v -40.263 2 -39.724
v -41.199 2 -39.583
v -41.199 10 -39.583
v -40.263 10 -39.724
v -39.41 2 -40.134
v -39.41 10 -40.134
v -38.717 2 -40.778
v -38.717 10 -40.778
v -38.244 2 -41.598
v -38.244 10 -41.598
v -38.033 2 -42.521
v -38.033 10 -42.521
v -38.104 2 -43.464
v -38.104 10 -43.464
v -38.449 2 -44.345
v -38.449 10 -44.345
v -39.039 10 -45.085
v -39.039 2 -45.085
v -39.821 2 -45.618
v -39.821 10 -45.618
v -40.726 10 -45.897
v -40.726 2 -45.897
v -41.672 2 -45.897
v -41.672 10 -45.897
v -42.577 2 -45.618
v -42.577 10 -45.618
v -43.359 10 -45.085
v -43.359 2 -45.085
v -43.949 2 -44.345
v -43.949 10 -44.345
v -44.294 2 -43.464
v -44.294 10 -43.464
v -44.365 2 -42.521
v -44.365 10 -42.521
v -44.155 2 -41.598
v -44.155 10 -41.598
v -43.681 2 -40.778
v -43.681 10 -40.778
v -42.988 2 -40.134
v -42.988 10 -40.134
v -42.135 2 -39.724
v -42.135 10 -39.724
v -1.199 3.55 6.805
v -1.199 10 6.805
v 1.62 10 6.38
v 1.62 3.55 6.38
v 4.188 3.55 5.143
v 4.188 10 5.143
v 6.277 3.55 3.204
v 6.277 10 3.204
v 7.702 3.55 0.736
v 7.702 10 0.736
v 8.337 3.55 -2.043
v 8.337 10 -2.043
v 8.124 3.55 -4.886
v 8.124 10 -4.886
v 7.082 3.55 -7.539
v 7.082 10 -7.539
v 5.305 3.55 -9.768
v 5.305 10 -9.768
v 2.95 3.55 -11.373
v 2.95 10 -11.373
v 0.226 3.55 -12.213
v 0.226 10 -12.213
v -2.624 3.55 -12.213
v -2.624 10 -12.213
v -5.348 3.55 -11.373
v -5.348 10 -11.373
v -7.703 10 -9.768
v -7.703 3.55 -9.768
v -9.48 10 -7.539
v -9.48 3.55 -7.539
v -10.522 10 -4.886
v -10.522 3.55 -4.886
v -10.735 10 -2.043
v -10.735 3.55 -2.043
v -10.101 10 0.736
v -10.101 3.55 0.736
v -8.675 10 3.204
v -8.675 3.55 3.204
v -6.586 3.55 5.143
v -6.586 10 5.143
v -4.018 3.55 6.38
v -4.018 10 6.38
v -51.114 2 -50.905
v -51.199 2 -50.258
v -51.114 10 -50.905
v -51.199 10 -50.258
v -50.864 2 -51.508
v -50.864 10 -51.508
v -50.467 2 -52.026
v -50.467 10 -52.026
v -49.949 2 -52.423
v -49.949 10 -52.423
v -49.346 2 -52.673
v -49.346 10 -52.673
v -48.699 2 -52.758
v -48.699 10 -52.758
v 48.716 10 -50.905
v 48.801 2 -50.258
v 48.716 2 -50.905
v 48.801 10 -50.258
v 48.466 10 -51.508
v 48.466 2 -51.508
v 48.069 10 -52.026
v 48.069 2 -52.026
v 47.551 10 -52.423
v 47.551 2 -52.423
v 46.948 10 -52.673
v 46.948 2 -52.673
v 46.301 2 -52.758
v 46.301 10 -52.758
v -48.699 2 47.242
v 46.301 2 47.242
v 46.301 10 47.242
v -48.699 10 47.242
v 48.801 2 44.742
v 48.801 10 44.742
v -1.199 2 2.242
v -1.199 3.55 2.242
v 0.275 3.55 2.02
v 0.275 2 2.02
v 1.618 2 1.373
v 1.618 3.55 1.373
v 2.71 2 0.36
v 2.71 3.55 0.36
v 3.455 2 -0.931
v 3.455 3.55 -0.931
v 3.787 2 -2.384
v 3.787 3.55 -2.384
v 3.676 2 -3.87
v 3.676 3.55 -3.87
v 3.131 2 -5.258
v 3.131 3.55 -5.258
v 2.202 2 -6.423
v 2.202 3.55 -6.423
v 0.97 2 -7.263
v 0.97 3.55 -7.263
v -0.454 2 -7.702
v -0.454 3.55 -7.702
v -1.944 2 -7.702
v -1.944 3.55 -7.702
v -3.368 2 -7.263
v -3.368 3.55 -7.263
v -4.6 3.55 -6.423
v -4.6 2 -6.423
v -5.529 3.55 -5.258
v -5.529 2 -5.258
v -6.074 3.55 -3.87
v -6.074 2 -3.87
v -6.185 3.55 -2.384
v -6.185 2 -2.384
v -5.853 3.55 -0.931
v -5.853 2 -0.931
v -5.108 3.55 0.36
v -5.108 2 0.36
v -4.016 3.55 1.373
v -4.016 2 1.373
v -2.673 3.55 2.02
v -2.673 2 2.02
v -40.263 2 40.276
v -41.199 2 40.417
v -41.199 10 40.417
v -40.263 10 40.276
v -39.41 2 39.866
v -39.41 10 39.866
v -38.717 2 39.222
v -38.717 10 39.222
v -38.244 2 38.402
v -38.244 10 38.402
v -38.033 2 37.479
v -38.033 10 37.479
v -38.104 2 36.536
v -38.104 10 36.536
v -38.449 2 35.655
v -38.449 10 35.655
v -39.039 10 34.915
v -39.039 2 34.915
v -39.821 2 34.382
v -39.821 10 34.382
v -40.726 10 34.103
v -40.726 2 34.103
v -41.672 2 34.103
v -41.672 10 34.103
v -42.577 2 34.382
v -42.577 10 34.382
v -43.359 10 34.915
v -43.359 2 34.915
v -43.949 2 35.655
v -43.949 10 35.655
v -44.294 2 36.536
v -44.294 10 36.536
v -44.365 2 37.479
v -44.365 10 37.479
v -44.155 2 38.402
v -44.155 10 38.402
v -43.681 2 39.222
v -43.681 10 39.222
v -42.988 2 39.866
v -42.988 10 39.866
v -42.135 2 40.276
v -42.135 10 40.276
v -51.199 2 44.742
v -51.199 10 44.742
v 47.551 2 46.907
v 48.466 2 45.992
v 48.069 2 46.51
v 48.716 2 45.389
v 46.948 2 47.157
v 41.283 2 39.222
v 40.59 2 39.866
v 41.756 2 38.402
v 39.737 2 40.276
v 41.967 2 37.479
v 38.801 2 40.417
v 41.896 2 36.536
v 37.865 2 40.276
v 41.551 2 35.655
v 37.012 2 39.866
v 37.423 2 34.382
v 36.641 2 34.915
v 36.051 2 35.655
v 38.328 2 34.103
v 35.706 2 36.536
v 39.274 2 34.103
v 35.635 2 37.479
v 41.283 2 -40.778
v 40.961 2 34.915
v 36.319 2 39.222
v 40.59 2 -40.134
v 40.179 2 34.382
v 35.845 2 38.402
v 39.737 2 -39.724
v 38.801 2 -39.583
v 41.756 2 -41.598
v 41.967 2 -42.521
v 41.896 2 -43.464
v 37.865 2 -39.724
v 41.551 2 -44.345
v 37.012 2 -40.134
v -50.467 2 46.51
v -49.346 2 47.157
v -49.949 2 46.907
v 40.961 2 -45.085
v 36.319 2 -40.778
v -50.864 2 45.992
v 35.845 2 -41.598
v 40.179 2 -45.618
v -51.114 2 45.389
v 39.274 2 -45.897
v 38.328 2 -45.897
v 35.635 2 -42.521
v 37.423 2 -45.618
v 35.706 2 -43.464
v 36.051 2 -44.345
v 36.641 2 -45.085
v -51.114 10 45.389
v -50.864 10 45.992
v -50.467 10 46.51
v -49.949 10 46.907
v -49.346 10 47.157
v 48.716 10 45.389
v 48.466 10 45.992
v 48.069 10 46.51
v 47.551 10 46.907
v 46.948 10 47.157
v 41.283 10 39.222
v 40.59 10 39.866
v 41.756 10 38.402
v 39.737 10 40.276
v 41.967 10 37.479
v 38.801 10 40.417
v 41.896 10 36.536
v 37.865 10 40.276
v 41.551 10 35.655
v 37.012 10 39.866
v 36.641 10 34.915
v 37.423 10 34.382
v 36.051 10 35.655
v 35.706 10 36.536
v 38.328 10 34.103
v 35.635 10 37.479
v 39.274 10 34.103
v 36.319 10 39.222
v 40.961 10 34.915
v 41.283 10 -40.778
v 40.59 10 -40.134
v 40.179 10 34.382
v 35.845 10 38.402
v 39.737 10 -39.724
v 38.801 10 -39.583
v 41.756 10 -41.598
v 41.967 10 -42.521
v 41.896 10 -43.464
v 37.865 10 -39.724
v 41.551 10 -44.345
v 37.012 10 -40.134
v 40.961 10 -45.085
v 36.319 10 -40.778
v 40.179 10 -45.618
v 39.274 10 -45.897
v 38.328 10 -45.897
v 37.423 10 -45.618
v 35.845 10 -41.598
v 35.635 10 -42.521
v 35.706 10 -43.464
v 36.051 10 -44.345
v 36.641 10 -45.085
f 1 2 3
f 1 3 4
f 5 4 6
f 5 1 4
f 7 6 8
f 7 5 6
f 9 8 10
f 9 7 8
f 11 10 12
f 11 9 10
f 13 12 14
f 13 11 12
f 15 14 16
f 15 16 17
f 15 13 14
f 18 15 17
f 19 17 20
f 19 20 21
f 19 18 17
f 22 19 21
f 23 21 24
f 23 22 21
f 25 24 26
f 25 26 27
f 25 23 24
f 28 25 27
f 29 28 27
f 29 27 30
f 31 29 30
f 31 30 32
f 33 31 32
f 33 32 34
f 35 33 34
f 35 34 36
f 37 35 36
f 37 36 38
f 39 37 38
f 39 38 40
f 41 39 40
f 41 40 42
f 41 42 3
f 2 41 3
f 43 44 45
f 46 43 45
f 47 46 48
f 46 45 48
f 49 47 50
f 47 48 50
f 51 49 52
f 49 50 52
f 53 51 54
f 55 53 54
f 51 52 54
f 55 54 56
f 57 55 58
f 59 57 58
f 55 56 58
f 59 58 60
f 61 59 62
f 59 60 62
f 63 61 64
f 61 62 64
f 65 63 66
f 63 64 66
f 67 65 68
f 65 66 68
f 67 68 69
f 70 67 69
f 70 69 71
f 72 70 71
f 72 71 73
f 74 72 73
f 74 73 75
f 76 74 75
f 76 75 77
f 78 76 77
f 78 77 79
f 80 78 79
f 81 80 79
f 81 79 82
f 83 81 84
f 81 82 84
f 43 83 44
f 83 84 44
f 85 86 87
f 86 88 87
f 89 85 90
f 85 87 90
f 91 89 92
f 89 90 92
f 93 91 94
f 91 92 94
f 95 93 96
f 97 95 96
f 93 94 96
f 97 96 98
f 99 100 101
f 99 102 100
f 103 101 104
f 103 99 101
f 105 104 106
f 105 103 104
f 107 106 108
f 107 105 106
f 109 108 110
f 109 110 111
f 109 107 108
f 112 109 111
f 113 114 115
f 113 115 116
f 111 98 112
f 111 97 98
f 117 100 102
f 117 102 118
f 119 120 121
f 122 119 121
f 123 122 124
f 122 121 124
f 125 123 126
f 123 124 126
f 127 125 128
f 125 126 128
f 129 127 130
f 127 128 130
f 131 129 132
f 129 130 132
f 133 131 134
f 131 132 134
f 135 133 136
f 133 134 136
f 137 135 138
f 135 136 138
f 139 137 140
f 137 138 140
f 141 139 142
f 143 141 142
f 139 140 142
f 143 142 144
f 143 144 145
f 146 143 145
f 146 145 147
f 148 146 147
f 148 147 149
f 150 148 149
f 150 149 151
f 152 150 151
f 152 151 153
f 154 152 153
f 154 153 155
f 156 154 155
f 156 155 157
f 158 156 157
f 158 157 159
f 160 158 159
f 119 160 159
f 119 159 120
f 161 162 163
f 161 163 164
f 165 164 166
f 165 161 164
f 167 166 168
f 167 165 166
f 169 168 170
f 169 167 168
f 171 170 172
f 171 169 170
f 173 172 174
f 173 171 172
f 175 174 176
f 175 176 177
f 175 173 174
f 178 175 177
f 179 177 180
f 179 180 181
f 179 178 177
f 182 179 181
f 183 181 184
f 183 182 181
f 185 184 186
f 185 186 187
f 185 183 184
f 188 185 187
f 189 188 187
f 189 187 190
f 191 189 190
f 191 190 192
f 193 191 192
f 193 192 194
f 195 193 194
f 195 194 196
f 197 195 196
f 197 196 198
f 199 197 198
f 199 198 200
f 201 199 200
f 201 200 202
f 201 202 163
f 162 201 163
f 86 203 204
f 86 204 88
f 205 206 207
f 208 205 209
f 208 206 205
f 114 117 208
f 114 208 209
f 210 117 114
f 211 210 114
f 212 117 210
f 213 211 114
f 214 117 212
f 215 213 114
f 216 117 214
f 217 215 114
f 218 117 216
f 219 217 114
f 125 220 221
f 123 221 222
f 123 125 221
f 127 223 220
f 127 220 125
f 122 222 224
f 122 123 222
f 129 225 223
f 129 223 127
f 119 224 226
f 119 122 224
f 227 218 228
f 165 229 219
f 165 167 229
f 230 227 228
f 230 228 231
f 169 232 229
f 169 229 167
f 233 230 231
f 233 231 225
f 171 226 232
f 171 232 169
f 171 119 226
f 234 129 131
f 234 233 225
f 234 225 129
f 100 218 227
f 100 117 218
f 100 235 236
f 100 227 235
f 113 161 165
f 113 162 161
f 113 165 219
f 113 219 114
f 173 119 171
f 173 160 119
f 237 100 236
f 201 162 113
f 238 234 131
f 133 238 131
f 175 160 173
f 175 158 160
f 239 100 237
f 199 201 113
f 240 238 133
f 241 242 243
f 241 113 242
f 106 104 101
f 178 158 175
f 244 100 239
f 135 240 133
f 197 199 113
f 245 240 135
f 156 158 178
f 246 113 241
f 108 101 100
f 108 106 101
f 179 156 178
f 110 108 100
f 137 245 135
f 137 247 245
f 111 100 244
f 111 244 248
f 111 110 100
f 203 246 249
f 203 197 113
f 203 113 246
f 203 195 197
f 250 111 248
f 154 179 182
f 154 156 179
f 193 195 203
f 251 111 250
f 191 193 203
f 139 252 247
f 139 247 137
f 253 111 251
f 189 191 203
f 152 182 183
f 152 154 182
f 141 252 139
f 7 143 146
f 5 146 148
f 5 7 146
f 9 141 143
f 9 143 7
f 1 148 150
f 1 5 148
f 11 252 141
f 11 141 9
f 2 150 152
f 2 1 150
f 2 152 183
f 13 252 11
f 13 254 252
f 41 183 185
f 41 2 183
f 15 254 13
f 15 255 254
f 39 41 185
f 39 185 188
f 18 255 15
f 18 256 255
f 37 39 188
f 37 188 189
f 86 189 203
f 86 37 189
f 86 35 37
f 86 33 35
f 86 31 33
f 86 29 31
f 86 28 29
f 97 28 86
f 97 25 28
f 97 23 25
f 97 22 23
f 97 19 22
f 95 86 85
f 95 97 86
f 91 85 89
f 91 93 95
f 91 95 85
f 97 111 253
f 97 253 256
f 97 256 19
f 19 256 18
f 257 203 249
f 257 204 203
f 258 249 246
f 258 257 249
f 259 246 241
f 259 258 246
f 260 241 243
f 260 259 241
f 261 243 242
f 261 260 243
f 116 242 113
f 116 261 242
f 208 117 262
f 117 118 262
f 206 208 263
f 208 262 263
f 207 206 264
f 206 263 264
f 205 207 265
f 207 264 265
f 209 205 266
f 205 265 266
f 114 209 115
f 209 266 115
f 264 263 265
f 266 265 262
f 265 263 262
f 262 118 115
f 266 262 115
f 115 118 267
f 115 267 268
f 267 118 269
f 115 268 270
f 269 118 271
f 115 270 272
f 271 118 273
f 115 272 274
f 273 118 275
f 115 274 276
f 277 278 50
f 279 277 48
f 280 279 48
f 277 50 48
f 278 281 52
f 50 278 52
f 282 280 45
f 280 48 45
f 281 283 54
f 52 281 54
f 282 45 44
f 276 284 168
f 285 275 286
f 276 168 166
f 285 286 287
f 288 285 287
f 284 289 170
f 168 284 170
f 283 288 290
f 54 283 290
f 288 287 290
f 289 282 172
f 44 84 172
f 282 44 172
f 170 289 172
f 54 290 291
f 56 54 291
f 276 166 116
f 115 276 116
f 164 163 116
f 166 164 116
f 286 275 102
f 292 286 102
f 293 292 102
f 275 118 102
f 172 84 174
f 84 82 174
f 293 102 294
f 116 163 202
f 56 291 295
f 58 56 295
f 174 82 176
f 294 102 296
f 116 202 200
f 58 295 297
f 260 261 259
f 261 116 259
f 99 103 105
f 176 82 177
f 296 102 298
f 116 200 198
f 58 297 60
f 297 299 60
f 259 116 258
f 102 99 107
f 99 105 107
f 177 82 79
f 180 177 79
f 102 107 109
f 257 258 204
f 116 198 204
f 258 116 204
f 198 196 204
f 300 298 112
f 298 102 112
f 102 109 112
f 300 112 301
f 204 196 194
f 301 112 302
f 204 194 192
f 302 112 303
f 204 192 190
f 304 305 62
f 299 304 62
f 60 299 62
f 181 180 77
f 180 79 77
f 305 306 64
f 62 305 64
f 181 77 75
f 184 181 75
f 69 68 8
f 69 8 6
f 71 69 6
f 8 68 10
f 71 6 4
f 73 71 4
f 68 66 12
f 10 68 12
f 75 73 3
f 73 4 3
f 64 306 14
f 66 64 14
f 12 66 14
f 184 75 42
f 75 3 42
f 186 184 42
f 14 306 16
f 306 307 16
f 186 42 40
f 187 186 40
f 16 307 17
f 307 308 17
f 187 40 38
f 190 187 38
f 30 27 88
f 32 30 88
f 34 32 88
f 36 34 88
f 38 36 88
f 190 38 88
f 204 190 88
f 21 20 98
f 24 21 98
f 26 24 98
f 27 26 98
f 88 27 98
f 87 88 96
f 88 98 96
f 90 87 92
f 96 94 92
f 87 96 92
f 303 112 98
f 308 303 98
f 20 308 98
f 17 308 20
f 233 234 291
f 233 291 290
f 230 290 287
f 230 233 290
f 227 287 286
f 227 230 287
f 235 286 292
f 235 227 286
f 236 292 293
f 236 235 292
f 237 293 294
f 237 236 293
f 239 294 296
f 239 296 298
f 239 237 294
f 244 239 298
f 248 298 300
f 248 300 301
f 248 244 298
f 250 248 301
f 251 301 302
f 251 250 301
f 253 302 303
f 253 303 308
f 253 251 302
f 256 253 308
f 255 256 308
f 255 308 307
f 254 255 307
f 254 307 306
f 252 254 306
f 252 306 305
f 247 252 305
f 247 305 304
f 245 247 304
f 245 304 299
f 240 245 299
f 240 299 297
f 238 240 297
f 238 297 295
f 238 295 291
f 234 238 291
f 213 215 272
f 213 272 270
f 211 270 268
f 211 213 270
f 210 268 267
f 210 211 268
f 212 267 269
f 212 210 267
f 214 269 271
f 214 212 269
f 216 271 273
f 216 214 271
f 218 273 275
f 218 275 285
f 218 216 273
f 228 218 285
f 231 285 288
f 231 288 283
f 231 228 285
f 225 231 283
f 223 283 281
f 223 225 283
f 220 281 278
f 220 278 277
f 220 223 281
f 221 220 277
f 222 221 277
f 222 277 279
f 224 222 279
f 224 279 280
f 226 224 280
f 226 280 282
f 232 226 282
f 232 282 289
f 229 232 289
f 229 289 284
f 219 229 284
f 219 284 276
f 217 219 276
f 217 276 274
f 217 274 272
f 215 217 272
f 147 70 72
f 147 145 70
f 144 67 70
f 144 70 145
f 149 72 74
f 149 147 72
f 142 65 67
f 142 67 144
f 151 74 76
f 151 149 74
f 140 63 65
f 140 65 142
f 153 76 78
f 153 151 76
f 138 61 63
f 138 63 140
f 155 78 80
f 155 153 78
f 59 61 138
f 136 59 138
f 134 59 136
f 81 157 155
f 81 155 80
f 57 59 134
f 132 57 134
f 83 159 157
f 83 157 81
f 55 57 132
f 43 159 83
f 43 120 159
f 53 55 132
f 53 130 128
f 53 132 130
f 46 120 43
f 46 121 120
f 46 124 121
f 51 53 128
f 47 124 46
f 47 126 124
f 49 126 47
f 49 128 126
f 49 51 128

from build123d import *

# Parameters (mm, degrees)
SKETCH1_R           = 12.7
SKETCH1_R_2         = 3.175
BOSS_EXTRUDE1_DEPTH = 10
SKETCH1_3_R         = 12.7
SKETCH1_3_R_2       = 6.35
BOSS_EXTRUDE2_DEPTH = 2.5
SKETCH2_R           = 12.7
BOSS_EXTRUDE3_DEPTH = 10
SKETCH3_R           = 5
CUT_EXTRUDE3_DEPTH  = 10
CUT_EXTRUDE4_START  = -1.45
SKETCH4_R           = 10
CUT_EXTRUDE4_DEPTH  = 5
CUT_EXTRUDE5_DEPTH  = 2
SKETCH7_R           = 10
CUT_EXTRUDE7_DEPTH  = 6.45
BOSS_EXTRUDE4_START = 6.45
SKETCH8_R           = 10
SKETCH8_R_2         = 9.5625
BOSS_EXTRUDE4_DEPTH = 6.45
BOSS_EXTRUDE5_START = -8
BOSS_EXTRUDE5_DEPTH = 8
FILLET1_R           = 2.5


with BuildPart() as part:
    # Sketch1 → Boss-Extrude1 (new body)
    with BuildSketch(Plane(origin=(0, 0, 0), x_dir=(1, 0, 0), z_dir=(0, 1, 0))):
        with BuildLine():
            Line((-41.199040767, 52.757793765), (38.800959233, 52.757793765))
            ThreePointArc((38.800959233, 52.757793765), (45.872027044, 49.828861577), (48.800959233, 42.757793765))
            Line((48.800959233, 42.757793765), (48.800959233, -37.242206235))
            ThreePointArc((48.800959233, -37.242206235), (45.872027044, -44.313274047), (38.800959233, -47.242206235))
            Line((38.800959233, -47.242206235), (-41.199040767, -47.242206235))
            ThreePointArc((-41.199040767, -47.242206235), (-48.270108579, -44.313274047), (-51.199040767, -37.242206235))
            Line((-51.199040767, -37.242206235), (-51.199040767, 42.757793765))
            ThreePointArc((-51.199040767, 42.757793765), (-48.270108579, 49.828861577), (-41.199040767, 52.757793765))
        make_face()
        with Locations(Location((0, 0, 0), (0, 0, 270))):
            Circle(SKETCH1_R, mode=Mode.SUBTRACT)
        with Locations(Location((-41.199040767, 42.757793765, 0), (0, 0, 270))):
            Circle(SKETCH1_R_2, mode=Mode.SUBTRACT)
        with Locations(Location((38.800959233, 42.757793765, 0), (0, 0, 270))):
            Circle(SKETCH1_R_2, mode=Mode.SUBTRACT)
        with Locations(Location((38.800959233, -37.242206235, 0), (0, 0, 270))):
            Circle(SKETCH1_R_2, mode=Mode.SUBTRACT)
        with Locations(Location((-41.199040767, -37.242206235, 0), (0, 0, 270))):
            Circle(SKETCH1_R_2, mode=Mode.SUBTRACT)
    extrude(amount=BOSS_EXTRUDE1_DEPTH)

    # Sketch1<3> → Boss-Extrude2 (add)
    with BuildSketch(Plane(origin=(0, 0, 0), x_dir=(1, 0, 0), z_dir=(0, 1, 0))):
        with Locations(Location((0, 0, 0), (0, 0, 270))):
            Circle(SKETCH1_3_R)
        with Locations(Location((0, 0, 0), (0, 0, 270))):
            Circle(SKETCH1_3_R_2, mode=Mode.SUBTRACT)
    extrude(amount=BOSS_EXTRUDE2_DEPTH)

    # Sketch2 → Boss-Extrude3 (add, through all)
    with BuildSketch(Plane(origin=(0, 10, 0), x_dir=(1, 0, 0), z_dir=(0, 1, 0))):
        Circle(SKETCH2_R)
    extrude(amount=-BOSS_EXTRUDE3_DEPTH)

    # Sketch3 → Cut-Extrude3 (cut)
    with BuildSketch(Plane(origin=(0, 10, 0), x_dir=(1, 0, 0), z_dir=(0, 1, 0))):
        with Locations(Location((-1.199040767, 2.757793765, 0), (0, 0, 270))):
            Circle(SKETCH3_R)
    extrude(amount=-CUT_EXTRUDE3_DEPTH, mode=Mode.SUBTRACT)

    # Sketch4 → Cut-Extrude4 (cut)
    with BuildSketch(Plane(origin=(0, 10, 0), x_dir=(1, 0, 0), z_dir=(0, 1, 0)).offset(CUT_EXTRUDE4_START)):
        with Locations(Location((-1.199040767, 2.757793765, 0), (0, 0, 270))):
            Circle(SKETCH4_R)
    extrude(amount=-CUT_EXTRUDE4_DEPTH, mode=Mode.SUBTRACT)

    # Sketch6 → Cut-Extrude5 (cut)
    with BuildSketch(Plane.XZ):
        with BuildLine():
            Line((48.800959233, -42.757793765), (48.800959233, 37.242206235))
            ThreePointArc((48.800959233, 37.242206235), (45.872027044, 44.313274047), (38.800959233, 47.242206235))
            Line((38.800959233, 47.242206235), (-41.199040767, 47.242206235))
            ThreePointArc((-41.199040767, 47.242206235), (-48.270108579, 44.313274047), (-51.199040767, 37.242206235))
            Line((-51.199040767, 37.242206235), (-51.199040767, -42.757793765))
            ThreePointArc((-51.199040767, -42.757793765), (-48.270108579, -49.828861577), (-41.199040767, -52.757793765))
            Line((-41.199040767, -52.757793765), (38.800959233, -52.757793765))
            ThreePointArc((38.800959233, -52.757793765), (45.872027044, -49.828861577), (48.800959233, -42.757793765))
        make_face()
    extrude(amount=-CUT_EXTRUDE5_DEPTH, mode=Mode.SUBTRACT)

    # Sketch7 → Cut-Extrude7 (cut)
    with BuildSketch(Plane(origin=(0, 10, 0), x_dir=(1, 0, 0), z_dir=(0, 1, 0))):
        with Locations(Location((-1.199040767, 2.757793765, 0), (0, 0, 270))):
            Circle(SKETCH7_R)
    extrude(amount=-CUT_EXTRUDE7_DEPTH, mode=Mode.SUBTRACT)

    # Sketch8 → Boss-Extrude4 (add)
    with BuildSketch(Plane(origin=(0, 3.55, 0), x_dir=(1, 0, 0), z_dir=(0, 1, 0)).offset(BOSS_EXTRUDE4_START)):
        with Locations((-1.199040767, 2.757793765)):
            Circle(SKETCH8_R)
        with Locations(Location((-1.199040767, 2.757793765, 0), (0, 0, 270))):
            Circle(SKETCH8_R_2, mode=Mode.SUBTRACT)
    extrude(amount=-BOSS_EXTRUDE4_DEPTH)

    # Sketch9 → Boss-Extrude5 (add)
    with BuildSketch(Plane(origin=(0, 10, 0), x_dir=(1, 0, 0), z_dir=(0, 1, 0)).offset(BOSS_EXTRUDE5_START)):
        with BuildLine():
            Line((-51.199040767, 42.757793765), (-51.199040767, 52.757793765))
            Line((-51.199040767, 52.757793765), (-41.199040767, 52.757793765))
            ThreePointArc((-41.199040767, 52.757793765), (-48.270108579, 49.828861577), (-51.199040767, 42.757793765))
        make_face()
        with BuildLine():
            Line((38.800959233, 52.757793765), (48.800959233, 52.757793765))
            Line((48.800959233, 52.757793765), (48.800959233, 42.757793765))
            ThreePointArc((48.800959233, 42.757793765), (45.872027044, 49.828861577), (38.800959233, 52.757793765))
        make_face()
        with BuildLine():
            Line((-51.199040767, -37.242206235), (-51.199040767, -47.242206235))
            Line((-51.199040767, -47.242206235), (-41.199040767, -47.242206235))
            ThreePointArc((-41.199040767, -47.242206235), (-48.270108579, -44.313274047), (-51.199040767, -37.242206235))
        make_face()
        with BuildLine():
            Line((48.800959233, -37.242206235), (48.800959233, -47.242206235))
            Line((48.800959233, -47.242206235), (38.800959233, -47.242206235))
            ThreePointArc((38.800959233, -47.242206235), (45.872027044, -44.313274047), (48.800959233, -37.242206235))
        make_face()
    extrude(amount=BOSS_EXTRUDE5_DEPTH)

    # Fillet1
    fillet1_edges = [part.edges().sort_by_distance(p)[0] for p in [
        (-51.199040767, 6, -52.757793765),
        (48.800959233, 6, -52.757793765),
        (48.800959233, 6, 47.242206235),
        (-51.199040767, 6, 47.242206235),
    ]]
    fillet(fillet1_edges, radius=FILLET1_R)


solid = part.part
